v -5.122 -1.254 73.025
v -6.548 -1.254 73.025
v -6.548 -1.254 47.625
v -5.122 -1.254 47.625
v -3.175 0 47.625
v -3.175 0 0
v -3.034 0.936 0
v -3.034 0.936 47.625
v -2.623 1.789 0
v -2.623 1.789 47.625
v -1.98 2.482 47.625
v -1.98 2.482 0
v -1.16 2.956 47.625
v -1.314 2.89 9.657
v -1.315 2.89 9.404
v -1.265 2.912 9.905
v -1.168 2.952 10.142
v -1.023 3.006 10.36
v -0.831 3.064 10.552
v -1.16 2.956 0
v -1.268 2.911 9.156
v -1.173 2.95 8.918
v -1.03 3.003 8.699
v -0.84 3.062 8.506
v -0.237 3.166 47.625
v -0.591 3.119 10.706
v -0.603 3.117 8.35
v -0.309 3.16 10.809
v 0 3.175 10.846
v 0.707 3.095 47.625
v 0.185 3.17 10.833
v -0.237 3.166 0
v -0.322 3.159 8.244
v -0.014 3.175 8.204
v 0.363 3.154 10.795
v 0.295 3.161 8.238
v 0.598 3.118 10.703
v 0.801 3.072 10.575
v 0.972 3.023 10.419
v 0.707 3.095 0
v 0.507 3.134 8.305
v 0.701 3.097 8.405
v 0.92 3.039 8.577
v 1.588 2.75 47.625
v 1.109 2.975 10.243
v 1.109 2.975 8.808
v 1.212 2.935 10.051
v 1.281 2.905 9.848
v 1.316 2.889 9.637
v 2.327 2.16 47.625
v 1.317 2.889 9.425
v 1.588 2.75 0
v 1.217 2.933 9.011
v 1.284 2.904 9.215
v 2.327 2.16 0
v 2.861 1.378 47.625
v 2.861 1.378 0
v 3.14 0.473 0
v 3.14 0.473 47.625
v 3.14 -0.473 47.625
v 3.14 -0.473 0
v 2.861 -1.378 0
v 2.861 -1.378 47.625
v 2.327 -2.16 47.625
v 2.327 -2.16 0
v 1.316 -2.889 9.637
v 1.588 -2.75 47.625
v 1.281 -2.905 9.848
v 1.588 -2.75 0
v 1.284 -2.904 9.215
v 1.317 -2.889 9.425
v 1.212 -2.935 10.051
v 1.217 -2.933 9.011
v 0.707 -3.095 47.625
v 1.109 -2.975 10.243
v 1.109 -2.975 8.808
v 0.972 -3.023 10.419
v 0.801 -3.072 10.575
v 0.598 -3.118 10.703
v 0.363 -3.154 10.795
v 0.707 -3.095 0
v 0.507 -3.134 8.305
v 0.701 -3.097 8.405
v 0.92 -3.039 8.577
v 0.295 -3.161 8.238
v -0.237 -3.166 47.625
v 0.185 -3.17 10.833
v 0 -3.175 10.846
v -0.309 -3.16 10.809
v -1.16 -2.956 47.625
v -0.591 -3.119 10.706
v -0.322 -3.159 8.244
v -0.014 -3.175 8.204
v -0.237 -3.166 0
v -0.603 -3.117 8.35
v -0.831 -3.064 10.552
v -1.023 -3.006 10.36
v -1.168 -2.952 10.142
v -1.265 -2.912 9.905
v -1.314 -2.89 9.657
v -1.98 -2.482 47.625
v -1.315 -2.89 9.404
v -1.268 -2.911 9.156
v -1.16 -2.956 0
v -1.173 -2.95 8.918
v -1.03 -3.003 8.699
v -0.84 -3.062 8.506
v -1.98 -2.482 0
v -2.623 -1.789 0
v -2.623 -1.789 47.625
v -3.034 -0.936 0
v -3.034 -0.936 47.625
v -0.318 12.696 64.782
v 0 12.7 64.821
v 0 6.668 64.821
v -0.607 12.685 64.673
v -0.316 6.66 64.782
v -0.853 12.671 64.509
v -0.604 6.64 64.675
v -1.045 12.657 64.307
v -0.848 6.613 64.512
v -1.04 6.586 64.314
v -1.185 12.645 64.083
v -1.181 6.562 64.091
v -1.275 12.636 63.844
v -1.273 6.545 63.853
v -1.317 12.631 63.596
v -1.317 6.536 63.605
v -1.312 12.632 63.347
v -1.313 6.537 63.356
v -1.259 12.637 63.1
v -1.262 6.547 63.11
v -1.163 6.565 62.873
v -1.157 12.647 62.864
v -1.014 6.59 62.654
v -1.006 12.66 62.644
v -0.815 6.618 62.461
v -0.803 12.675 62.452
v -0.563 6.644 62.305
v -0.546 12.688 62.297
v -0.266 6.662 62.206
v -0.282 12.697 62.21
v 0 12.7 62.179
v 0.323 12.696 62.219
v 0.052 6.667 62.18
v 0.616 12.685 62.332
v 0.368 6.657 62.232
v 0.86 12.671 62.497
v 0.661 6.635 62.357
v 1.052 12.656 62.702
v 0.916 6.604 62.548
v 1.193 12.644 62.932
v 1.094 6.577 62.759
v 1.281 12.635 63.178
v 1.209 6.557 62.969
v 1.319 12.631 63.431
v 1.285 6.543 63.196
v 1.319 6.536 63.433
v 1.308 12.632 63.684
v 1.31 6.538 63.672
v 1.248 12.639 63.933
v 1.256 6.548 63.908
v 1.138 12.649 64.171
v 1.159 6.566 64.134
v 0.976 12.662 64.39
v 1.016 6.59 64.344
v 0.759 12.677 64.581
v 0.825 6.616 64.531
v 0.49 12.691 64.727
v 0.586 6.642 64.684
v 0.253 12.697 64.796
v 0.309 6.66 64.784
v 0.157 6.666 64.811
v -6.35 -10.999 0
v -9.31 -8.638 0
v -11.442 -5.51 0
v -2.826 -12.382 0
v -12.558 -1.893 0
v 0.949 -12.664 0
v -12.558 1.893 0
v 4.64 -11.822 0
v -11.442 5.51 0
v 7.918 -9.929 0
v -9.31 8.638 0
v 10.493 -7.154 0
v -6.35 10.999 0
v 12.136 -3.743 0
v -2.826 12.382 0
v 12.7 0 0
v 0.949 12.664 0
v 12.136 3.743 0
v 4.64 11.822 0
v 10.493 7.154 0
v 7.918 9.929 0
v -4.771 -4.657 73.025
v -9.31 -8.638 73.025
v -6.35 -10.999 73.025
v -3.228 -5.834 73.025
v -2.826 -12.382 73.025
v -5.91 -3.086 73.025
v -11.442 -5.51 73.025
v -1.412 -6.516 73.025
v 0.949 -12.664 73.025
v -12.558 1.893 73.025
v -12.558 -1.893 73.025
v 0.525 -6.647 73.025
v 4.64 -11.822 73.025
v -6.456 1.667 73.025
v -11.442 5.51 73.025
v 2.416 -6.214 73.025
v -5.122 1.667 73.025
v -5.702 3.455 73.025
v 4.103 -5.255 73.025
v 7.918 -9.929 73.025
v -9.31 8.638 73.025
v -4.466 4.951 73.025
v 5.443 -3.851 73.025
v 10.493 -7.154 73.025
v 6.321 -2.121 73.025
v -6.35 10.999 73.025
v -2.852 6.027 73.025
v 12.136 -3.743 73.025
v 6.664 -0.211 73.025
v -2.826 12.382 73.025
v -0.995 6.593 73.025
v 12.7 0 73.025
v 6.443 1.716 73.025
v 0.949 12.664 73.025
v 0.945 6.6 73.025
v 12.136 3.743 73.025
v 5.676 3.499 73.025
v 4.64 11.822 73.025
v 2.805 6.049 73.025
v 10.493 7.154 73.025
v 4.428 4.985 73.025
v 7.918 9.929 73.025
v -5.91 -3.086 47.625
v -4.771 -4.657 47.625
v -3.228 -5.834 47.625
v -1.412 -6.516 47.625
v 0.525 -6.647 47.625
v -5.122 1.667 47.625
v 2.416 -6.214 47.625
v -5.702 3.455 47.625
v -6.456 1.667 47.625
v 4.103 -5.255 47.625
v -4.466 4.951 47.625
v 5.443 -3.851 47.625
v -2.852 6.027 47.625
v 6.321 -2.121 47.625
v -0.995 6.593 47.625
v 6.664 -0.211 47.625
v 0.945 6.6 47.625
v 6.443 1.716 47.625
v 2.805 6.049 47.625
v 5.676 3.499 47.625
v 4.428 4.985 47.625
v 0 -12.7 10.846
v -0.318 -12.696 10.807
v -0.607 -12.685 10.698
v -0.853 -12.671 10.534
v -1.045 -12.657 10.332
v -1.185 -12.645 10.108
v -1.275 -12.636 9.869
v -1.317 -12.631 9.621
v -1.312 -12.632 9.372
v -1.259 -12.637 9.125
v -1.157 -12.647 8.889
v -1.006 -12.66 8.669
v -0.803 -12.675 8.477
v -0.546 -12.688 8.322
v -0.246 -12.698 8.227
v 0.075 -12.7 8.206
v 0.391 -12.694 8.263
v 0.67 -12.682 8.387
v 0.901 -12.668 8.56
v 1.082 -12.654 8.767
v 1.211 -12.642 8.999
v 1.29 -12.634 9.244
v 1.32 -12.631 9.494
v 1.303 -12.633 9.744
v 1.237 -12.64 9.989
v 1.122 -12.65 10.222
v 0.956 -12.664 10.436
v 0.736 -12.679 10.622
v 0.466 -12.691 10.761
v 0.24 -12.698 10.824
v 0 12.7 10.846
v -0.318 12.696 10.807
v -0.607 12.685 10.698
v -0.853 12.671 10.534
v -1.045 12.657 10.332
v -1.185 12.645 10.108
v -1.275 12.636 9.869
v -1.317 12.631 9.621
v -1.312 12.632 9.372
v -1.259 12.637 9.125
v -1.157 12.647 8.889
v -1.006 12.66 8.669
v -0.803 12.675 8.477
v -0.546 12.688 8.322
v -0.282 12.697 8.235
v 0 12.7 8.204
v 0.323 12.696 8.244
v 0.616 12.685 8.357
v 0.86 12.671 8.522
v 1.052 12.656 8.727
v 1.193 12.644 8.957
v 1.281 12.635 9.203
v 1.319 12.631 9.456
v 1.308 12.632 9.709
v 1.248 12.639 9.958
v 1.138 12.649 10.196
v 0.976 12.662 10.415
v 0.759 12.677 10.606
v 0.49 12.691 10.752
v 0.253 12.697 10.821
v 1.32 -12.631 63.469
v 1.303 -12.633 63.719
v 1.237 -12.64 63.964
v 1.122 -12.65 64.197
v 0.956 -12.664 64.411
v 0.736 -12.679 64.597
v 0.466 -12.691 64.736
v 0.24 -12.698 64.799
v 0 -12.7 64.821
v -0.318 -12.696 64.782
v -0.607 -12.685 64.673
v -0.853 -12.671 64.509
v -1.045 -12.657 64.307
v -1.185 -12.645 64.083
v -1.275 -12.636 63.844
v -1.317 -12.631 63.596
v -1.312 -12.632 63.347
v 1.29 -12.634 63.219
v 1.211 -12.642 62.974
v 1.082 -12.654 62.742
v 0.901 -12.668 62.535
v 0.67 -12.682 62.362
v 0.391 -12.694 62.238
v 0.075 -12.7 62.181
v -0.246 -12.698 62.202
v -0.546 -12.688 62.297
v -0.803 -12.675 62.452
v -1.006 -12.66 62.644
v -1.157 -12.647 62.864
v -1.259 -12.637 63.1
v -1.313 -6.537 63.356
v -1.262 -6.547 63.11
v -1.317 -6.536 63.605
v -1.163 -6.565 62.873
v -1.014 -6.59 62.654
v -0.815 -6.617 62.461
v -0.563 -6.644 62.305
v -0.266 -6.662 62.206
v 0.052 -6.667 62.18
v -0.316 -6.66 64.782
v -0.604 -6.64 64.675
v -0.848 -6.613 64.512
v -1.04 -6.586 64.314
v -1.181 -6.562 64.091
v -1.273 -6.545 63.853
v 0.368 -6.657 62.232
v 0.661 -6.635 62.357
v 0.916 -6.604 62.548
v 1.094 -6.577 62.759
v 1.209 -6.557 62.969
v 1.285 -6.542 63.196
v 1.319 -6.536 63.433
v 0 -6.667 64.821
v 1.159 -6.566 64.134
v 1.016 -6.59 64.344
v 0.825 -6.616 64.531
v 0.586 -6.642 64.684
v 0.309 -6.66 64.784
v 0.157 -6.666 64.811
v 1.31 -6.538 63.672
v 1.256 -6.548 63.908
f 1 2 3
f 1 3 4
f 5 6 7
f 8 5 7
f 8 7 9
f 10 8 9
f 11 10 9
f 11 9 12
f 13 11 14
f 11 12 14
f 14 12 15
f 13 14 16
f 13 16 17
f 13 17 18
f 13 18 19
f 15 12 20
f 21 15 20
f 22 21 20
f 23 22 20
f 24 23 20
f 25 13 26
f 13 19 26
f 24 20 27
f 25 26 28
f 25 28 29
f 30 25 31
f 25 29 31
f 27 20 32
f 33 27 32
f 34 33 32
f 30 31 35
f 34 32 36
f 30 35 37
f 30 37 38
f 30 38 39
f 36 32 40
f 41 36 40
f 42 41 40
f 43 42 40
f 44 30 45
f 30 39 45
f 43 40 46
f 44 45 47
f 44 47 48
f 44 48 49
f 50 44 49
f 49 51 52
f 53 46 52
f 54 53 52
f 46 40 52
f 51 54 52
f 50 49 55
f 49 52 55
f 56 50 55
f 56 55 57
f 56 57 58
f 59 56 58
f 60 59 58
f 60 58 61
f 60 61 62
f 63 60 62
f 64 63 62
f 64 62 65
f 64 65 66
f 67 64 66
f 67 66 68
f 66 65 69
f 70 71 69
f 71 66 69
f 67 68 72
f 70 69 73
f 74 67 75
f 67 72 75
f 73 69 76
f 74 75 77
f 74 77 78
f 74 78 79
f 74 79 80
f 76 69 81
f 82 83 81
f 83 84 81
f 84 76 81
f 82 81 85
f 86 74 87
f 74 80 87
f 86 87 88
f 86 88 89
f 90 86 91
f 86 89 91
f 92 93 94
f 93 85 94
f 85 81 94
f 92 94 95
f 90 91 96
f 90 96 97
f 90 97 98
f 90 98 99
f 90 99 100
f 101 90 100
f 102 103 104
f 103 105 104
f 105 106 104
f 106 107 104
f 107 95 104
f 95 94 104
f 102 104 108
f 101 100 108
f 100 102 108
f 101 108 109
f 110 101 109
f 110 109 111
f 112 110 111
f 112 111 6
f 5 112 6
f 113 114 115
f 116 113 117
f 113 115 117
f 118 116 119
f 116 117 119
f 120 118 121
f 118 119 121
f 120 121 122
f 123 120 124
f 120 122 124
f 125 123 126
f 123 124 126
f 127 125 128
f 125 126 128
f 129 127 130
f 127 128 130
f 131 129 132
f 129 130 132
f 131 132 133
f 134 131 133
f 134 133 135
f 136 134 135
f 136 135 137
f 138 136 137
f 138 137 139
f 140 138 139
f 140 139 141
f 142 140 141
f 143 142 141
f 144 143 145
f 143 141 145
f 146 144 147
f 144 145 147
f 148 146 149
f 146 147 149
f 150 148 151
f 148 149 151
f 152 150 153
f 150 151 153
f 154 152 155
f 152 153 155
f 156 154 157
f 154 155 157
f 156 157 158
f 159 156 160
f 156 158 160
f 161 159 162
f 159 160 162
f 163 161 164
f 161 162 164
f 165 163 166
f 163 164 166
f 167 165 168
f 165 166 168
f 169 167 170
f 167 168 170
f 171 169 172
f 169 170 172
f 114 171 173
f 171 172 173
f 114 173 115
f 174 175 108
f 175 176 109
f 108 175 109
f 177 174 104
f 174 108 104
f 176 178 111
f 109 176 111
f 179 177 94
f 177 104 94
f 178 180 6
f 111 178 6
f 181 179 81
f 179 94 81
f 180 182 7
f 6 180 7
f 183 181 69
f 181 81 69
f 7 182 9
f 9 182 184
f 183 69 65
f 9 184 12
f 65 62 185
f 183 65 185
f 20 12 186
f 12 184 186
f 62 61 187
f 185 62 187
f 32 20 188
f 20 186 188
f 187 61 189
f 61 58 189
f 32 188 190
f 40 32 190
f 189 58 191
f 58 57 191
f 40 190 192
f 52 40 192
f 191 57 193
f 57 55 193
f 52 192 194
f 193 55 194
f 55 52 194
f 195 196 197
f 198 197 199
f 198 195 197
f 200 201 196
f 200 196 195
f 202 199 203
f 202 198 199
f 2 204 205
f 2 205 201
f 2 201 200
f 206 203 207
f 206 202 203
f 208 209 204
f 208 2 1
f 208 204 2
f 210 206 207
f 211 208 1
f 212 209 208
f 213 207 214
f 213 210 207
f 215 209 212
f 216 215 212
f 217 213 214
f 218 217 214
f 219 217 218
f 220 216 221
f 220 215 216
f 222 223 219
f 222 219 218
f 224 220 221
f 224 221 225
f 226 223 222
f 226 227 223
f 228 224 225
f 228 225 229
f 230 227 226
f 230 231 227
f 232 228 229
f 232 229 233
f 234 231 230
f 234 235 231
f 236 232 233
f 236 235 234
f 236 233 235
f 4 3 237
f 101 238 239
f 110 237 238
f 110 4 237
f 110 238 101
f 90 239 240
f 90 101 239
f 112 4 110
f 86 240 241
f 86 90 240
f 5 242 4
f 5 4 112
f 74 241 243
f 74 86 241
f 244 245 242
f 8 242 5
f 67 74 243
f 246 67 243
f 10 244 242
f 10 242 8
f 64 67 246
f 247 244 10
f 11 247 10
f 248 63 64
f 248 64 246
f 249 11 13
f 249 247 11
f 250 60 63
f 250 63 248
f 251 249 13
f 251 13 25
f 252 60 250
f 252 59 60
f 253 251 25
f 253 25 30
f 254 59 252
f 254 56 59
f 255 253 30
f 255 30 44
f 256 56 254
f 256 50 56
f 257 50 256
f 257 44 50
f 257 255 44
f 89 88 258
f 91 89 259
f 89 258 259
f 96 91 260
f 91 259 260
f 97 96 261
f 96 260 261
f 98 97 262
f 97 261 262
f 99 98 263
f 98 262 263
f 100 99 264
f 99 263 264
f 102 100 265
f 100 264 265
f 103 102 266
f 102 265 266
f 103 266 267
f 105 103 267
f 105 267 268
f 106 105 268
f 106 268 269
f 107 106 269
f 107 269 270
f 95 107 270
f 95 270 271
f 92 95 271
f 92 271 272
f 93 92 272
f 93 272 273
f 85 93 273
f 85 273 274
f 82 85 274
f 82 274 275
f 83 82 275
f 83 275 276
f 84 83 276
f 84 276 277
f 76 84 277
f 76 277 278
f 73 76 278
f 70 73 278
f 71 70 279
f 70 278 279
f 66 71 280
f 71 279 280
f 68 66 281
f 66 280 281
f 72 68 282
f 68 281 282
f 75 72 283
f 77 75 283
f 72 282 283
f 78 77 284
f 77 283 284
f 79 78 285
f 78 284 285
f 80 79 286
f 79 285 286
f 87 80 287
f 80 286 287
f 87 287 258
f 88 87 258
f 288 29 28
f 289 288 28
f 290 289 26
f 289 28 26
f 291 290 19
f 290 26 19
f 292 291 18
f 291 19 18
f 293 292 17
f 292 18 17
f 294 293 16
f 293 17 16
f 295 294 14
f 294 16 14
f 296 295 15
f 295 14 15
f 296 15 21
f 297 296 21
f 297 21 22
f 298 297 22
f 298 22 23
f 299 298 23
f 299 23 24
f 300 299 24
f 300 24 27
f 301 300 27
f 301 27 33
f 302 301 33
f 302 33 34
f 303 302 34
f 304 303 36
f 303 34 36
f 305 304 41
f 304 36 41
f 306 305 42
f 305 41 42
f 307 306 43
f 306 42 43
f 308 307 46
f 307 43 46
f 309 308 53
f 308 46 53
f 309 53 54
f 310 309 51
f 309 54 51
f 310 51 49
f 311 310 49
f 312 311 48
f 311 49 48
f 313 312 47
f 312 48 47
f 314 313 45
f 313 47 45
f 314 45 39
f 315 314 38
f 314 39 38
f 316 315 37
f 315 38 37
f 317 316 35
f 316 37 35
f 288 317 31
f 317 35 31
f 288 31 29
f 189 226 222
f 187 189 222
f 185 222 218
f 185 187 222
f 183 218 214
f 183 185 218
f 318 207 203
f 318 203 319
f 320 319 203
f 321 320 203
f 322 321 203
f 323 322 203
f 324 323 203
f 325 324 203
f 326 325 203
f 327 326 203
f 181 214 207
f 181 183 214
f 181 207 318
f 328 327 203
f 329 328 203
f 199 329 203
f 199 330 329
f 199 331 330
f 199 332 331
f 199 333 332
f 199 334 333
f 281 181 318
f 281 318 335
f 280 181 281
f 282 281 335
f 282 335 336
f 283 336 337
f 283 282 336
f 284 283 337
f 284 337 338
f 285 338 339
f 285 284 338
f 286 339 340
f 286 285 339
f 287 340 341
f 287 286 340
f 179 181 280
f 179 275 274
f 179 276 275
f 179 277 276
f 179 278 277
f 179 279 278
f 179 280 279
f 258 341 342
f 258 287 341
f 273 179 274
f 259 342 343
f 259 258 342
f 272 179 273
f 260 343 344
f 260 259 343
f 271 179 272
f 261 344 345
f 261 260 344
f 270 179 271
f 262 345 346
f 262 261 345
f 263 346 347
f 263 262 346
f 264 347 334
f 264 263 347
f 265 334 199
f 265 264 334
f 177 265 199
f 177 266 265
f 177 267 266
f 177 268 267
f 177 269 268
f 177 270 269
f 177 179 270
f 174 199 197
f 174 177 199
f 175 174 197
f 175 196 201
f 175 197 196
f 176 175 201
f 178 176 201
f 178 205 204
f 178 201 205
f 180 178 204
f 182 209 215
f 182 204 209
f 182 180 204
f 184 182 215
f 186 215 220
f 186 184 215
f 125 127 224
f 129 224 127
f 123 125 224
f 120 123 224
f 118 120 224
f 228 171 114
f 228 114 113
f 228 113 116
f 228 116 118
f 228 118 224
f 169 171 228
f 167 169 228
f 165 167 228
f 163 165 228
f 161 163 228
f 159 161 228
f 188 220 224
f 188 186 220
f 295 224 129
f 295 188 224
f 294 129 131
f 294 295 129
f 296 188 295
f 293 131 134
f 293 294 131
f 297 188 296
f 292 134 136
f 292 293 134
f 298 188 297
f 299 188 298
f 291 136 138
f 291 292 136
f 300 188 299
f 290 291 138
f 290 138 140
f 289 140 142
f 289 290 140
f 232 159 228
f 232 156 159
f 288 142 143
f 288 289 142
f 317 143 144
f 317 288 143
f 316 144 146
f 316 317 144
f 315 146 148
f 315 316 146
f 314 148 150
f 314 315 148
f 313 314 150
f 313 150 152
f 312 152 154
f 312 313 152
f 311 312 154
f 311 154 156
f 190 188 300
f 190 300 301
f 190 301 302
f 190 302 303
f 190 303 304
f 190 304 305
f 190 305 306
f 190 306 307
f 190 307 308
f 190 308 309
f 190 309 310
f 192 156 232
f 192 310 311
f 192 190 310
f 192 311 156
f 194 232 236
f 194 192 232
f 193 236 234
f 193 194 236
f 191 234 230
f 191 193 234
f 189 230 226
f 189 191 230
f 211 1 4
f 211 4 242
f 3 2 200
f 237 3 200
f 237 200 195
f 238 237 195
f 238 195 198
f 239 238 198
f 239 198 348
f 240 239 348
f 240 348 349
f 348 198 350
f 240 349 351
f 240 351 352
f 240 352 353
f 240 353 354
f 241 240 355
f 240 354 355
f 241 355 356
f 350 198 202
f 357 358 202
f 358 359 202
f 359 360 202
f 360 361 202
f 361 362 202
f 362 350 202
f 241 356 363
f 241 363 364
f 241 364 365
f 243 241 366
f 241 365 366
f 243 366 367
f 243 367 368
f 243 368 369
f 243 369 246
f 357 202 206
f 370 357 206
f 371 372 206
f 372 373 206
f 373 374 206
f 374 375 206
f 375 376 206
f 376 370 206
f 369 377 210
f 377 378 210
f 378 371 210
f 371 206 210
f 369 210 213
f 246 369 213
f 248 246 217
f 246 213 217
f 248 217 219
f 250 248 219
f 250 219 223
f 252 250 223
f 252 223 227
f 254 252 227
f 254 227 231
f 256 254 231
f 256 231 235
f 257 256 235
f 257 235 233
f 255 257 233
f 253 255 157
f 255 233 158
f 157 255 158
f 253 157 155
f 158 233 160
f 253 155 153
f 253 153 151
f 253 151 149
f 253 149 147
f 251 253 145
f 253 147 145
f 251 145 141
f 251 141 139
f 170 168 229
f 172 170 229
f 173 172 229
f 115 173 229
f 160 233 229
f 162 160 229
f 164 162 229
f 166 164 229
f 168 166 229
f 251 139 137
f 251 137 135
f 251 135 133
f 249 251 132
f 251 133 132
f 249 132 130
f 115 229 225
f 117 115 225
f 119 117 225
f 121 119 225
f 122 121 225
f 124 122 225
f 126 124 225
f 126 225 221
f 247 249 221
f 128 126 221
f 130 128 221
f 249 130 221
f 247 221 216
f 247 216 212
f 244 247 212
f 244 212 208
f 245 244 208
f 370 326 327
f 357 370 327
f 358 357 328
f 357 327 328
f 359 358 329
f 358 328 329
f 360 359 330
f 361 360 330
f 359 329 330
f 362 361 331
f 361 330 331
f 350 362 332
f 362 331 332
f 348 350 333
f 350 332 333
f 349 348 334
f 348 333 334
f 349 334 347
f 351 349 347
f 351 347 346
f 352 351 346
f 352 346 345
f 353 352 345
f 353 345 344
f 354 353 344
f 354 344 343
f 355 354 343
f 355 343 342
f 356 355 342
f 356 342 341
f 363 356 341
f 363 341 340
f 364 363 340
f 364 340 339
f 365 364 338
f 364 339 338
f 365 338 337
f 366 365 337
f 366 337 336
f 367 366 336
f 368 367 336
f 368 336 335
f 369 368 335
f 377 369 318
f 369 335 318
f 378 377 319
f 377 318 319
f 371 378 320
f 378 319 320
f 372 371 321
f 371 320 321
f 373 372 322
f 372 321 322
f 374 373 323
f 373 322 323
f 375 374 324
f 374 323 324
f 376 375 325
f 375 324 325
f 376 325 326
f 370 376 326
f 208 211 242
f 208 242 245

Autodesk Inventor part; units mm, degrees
ref_plane "YZ Plane" through (0, 0, 0) normal (1, 0, 0) x (0, 1, 0)
ref_plane "XY Plane" through (0, 0, 0) normal (0, 0, 1) x (1, 0, 0)
sketch "Sketch2" plane through (0, 0, 0) normal (0, 0, 1) x (1, 0, 0)
  circle A0 centre (0, 0) radius 12.7
  dimension "d0" = 25.4
extrude "Extrusion1" add sketch "Sketch2" along normal blind 73.025
sketch "Sketch3" plane through (0, 0, 73.025) normal (0, 0, 1) x (1, 0, 0)
  arc A0 (-6.5485, -1.2541) -> (-6.4558, 1.6669) centre (0, 0) ccw
  circle A1 centre (0, 0) radius 12.7 construction
  line L0 (-12.7, 0) -> (12.7, 0) construction
  line L1 (-6.35, 0) -> (-4.7625, 1.5875) construction
  line L2 (-4.7625, -1.5875) -> (-6.35, 0) construction
  line L3 (-6.5485, -1.2541) -> (-5.1223, -1.2541)
  line L4 (-5.1223, -1.2541) -> (-5.1223, 1.6669)
  line L5 (-5.1223, 1.6669) -> (-6.4558, 1.6669)
  dimension "d3" = 13.335
  dimension "d22" = 2.921
  dimension "d23" = 1.3335
extrude "Extrusion2" cut sketch "Sketch3" against normal blind 25.4
sketch "Sketch4" plane through (0, 0, 0) normal (0, 0, -1) x (-1, 0, 0)
  circle A0 centre (0, 0) radius 3.175
  dimension "d10" = 6.35
extrude "Extrusion3" cut sketch "Sketch4" against normal through all
ref_plane "Work Plane1" through (0, 12.7, 0) normal (0, 1, 0) x (-1, 0, 0)
sketch "Sketch5" plane through (0, 12.7, 0) normal (0, 1, 0) x (-1, 0, 0)
  line L0 (-12.7, 0) -> (12.7, 0) projected
  point P0 (0, 0)
  point P1 (0, 9.525)
  dimension "d13" = 9.525
hole "Hole1" at (0, 12.7, 9.525) direction (0, -1, 0) diameter 2.6416 end through all thread size "6-32 UNC" class "2B" standard "ANSI Unified Screw Threads"
sketch "Sketch6" plane through (0, 12.7, 0) normal (0, 1, 0) x (-1, 0, 0)
  line L0 (12.7, 73.025) -> (-12.7, 73.025) projected
  point P0 (0, 0)
  point P1 (0, 63.5)
  dimension "d24" = 9.525
hole "Hole2" at (0, 12.7, 63.5) direction (0, -1, 0) diameter 2.6416 end through all thread size "6-32 UNC" class "2B" standard "ANSI Unified Screw Threads"
equation "\"d1\" = length"
equation "\"d3\" = shaftDiameter + shaftClearance"
equation "\"d22\" = keywayWidth"
equation "\"d23\" = keywayDepth"
equation "\"length\" = 73.025"
equation "\"shaftDiameter\" = 12.7"
equation "\"shaftClearance\" = 0.635"
equation "\"keywayWidth\" = 2.921"
equation "\"keywayDepth\" = 1.3335"
properties part number "ShaftToConnectPotToMotor" material "Aluminum 6061"
